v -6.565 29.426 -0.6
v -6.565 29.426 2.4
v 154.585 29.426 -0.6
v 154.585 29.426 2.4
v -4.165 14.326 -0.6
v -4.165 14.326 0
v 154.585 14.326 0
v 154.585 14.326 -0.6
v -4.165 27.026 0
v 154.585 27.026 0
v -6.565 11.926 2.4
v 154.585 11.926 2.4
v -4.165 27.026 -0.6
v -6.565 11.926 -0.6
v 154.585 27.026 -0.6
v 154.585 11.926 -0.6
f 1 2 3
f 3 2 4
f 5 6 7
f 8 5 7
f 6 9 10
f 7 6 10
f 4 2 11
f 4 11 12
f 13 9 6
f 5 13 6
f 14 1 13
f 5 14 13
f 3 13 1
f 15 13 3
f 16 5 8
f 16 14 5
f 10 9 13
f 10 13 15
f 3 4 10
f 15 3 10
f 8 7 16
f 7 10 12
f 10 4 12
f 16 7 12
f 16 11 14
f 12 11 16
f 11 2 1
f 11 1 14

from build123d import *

# Parameters (mm, degrees)
F0_W     = 161.15
F0_H     = 17.5
F1_DEPTH = 2.4
F2_W     = 161.15
F2_H     = 2.4
F3_DEPTH = 0.6
F4_W     = 161.15
F4_H     = 2.4
F5_DEPTH = 0.6
F6_W     = 2.4
F6_H     = 12.7
F7_DEPTH = 0.6


with BuildPart() as f1:
    # F0 (on Top) → F1 (new body)
    with BuildSketch(Plane.XY):
        with Locations((74.009652, 20.676134)):
            Rectangle(F0_W, F0_H)
    extrude(amount=F1_DEPTH)

    # F2 (on face) → F3 (join)
    with BuildSketch(Plane(origin=(0, 0, 0), x_dir=(1, 0, 0), z_dir=(0, 0, -1))):
        with Locations((74.009652, -28.226134)):
            Rectangle(F2_W, F2_H)
    extrude(amount=F3_DEPTH)

    # F4 (on face) → F5 (join)
    with BuildSketch(Plane(origin=(0, 0, 0), x_dir=(1, 0, 0), z_dir=(0, 0, -1))):
        with Locations((74.009652, -13.126134)):
            Rectangle(F4_W, F4_H)
    extrude(amount=F5_DEPTH)

    # F6 (on face) → F7 (join)
    with BuildSketch(Plane(origin=(0, 0, 0), x_dir=(1, 0, 0), z_dir=(0, 0, -1))):
        with Locations((-5.365348, -20.676134)):
            Rectangle(F6_W, F6_H)
    extrude(amount=F7_DEPTH)


solid = f1.part
